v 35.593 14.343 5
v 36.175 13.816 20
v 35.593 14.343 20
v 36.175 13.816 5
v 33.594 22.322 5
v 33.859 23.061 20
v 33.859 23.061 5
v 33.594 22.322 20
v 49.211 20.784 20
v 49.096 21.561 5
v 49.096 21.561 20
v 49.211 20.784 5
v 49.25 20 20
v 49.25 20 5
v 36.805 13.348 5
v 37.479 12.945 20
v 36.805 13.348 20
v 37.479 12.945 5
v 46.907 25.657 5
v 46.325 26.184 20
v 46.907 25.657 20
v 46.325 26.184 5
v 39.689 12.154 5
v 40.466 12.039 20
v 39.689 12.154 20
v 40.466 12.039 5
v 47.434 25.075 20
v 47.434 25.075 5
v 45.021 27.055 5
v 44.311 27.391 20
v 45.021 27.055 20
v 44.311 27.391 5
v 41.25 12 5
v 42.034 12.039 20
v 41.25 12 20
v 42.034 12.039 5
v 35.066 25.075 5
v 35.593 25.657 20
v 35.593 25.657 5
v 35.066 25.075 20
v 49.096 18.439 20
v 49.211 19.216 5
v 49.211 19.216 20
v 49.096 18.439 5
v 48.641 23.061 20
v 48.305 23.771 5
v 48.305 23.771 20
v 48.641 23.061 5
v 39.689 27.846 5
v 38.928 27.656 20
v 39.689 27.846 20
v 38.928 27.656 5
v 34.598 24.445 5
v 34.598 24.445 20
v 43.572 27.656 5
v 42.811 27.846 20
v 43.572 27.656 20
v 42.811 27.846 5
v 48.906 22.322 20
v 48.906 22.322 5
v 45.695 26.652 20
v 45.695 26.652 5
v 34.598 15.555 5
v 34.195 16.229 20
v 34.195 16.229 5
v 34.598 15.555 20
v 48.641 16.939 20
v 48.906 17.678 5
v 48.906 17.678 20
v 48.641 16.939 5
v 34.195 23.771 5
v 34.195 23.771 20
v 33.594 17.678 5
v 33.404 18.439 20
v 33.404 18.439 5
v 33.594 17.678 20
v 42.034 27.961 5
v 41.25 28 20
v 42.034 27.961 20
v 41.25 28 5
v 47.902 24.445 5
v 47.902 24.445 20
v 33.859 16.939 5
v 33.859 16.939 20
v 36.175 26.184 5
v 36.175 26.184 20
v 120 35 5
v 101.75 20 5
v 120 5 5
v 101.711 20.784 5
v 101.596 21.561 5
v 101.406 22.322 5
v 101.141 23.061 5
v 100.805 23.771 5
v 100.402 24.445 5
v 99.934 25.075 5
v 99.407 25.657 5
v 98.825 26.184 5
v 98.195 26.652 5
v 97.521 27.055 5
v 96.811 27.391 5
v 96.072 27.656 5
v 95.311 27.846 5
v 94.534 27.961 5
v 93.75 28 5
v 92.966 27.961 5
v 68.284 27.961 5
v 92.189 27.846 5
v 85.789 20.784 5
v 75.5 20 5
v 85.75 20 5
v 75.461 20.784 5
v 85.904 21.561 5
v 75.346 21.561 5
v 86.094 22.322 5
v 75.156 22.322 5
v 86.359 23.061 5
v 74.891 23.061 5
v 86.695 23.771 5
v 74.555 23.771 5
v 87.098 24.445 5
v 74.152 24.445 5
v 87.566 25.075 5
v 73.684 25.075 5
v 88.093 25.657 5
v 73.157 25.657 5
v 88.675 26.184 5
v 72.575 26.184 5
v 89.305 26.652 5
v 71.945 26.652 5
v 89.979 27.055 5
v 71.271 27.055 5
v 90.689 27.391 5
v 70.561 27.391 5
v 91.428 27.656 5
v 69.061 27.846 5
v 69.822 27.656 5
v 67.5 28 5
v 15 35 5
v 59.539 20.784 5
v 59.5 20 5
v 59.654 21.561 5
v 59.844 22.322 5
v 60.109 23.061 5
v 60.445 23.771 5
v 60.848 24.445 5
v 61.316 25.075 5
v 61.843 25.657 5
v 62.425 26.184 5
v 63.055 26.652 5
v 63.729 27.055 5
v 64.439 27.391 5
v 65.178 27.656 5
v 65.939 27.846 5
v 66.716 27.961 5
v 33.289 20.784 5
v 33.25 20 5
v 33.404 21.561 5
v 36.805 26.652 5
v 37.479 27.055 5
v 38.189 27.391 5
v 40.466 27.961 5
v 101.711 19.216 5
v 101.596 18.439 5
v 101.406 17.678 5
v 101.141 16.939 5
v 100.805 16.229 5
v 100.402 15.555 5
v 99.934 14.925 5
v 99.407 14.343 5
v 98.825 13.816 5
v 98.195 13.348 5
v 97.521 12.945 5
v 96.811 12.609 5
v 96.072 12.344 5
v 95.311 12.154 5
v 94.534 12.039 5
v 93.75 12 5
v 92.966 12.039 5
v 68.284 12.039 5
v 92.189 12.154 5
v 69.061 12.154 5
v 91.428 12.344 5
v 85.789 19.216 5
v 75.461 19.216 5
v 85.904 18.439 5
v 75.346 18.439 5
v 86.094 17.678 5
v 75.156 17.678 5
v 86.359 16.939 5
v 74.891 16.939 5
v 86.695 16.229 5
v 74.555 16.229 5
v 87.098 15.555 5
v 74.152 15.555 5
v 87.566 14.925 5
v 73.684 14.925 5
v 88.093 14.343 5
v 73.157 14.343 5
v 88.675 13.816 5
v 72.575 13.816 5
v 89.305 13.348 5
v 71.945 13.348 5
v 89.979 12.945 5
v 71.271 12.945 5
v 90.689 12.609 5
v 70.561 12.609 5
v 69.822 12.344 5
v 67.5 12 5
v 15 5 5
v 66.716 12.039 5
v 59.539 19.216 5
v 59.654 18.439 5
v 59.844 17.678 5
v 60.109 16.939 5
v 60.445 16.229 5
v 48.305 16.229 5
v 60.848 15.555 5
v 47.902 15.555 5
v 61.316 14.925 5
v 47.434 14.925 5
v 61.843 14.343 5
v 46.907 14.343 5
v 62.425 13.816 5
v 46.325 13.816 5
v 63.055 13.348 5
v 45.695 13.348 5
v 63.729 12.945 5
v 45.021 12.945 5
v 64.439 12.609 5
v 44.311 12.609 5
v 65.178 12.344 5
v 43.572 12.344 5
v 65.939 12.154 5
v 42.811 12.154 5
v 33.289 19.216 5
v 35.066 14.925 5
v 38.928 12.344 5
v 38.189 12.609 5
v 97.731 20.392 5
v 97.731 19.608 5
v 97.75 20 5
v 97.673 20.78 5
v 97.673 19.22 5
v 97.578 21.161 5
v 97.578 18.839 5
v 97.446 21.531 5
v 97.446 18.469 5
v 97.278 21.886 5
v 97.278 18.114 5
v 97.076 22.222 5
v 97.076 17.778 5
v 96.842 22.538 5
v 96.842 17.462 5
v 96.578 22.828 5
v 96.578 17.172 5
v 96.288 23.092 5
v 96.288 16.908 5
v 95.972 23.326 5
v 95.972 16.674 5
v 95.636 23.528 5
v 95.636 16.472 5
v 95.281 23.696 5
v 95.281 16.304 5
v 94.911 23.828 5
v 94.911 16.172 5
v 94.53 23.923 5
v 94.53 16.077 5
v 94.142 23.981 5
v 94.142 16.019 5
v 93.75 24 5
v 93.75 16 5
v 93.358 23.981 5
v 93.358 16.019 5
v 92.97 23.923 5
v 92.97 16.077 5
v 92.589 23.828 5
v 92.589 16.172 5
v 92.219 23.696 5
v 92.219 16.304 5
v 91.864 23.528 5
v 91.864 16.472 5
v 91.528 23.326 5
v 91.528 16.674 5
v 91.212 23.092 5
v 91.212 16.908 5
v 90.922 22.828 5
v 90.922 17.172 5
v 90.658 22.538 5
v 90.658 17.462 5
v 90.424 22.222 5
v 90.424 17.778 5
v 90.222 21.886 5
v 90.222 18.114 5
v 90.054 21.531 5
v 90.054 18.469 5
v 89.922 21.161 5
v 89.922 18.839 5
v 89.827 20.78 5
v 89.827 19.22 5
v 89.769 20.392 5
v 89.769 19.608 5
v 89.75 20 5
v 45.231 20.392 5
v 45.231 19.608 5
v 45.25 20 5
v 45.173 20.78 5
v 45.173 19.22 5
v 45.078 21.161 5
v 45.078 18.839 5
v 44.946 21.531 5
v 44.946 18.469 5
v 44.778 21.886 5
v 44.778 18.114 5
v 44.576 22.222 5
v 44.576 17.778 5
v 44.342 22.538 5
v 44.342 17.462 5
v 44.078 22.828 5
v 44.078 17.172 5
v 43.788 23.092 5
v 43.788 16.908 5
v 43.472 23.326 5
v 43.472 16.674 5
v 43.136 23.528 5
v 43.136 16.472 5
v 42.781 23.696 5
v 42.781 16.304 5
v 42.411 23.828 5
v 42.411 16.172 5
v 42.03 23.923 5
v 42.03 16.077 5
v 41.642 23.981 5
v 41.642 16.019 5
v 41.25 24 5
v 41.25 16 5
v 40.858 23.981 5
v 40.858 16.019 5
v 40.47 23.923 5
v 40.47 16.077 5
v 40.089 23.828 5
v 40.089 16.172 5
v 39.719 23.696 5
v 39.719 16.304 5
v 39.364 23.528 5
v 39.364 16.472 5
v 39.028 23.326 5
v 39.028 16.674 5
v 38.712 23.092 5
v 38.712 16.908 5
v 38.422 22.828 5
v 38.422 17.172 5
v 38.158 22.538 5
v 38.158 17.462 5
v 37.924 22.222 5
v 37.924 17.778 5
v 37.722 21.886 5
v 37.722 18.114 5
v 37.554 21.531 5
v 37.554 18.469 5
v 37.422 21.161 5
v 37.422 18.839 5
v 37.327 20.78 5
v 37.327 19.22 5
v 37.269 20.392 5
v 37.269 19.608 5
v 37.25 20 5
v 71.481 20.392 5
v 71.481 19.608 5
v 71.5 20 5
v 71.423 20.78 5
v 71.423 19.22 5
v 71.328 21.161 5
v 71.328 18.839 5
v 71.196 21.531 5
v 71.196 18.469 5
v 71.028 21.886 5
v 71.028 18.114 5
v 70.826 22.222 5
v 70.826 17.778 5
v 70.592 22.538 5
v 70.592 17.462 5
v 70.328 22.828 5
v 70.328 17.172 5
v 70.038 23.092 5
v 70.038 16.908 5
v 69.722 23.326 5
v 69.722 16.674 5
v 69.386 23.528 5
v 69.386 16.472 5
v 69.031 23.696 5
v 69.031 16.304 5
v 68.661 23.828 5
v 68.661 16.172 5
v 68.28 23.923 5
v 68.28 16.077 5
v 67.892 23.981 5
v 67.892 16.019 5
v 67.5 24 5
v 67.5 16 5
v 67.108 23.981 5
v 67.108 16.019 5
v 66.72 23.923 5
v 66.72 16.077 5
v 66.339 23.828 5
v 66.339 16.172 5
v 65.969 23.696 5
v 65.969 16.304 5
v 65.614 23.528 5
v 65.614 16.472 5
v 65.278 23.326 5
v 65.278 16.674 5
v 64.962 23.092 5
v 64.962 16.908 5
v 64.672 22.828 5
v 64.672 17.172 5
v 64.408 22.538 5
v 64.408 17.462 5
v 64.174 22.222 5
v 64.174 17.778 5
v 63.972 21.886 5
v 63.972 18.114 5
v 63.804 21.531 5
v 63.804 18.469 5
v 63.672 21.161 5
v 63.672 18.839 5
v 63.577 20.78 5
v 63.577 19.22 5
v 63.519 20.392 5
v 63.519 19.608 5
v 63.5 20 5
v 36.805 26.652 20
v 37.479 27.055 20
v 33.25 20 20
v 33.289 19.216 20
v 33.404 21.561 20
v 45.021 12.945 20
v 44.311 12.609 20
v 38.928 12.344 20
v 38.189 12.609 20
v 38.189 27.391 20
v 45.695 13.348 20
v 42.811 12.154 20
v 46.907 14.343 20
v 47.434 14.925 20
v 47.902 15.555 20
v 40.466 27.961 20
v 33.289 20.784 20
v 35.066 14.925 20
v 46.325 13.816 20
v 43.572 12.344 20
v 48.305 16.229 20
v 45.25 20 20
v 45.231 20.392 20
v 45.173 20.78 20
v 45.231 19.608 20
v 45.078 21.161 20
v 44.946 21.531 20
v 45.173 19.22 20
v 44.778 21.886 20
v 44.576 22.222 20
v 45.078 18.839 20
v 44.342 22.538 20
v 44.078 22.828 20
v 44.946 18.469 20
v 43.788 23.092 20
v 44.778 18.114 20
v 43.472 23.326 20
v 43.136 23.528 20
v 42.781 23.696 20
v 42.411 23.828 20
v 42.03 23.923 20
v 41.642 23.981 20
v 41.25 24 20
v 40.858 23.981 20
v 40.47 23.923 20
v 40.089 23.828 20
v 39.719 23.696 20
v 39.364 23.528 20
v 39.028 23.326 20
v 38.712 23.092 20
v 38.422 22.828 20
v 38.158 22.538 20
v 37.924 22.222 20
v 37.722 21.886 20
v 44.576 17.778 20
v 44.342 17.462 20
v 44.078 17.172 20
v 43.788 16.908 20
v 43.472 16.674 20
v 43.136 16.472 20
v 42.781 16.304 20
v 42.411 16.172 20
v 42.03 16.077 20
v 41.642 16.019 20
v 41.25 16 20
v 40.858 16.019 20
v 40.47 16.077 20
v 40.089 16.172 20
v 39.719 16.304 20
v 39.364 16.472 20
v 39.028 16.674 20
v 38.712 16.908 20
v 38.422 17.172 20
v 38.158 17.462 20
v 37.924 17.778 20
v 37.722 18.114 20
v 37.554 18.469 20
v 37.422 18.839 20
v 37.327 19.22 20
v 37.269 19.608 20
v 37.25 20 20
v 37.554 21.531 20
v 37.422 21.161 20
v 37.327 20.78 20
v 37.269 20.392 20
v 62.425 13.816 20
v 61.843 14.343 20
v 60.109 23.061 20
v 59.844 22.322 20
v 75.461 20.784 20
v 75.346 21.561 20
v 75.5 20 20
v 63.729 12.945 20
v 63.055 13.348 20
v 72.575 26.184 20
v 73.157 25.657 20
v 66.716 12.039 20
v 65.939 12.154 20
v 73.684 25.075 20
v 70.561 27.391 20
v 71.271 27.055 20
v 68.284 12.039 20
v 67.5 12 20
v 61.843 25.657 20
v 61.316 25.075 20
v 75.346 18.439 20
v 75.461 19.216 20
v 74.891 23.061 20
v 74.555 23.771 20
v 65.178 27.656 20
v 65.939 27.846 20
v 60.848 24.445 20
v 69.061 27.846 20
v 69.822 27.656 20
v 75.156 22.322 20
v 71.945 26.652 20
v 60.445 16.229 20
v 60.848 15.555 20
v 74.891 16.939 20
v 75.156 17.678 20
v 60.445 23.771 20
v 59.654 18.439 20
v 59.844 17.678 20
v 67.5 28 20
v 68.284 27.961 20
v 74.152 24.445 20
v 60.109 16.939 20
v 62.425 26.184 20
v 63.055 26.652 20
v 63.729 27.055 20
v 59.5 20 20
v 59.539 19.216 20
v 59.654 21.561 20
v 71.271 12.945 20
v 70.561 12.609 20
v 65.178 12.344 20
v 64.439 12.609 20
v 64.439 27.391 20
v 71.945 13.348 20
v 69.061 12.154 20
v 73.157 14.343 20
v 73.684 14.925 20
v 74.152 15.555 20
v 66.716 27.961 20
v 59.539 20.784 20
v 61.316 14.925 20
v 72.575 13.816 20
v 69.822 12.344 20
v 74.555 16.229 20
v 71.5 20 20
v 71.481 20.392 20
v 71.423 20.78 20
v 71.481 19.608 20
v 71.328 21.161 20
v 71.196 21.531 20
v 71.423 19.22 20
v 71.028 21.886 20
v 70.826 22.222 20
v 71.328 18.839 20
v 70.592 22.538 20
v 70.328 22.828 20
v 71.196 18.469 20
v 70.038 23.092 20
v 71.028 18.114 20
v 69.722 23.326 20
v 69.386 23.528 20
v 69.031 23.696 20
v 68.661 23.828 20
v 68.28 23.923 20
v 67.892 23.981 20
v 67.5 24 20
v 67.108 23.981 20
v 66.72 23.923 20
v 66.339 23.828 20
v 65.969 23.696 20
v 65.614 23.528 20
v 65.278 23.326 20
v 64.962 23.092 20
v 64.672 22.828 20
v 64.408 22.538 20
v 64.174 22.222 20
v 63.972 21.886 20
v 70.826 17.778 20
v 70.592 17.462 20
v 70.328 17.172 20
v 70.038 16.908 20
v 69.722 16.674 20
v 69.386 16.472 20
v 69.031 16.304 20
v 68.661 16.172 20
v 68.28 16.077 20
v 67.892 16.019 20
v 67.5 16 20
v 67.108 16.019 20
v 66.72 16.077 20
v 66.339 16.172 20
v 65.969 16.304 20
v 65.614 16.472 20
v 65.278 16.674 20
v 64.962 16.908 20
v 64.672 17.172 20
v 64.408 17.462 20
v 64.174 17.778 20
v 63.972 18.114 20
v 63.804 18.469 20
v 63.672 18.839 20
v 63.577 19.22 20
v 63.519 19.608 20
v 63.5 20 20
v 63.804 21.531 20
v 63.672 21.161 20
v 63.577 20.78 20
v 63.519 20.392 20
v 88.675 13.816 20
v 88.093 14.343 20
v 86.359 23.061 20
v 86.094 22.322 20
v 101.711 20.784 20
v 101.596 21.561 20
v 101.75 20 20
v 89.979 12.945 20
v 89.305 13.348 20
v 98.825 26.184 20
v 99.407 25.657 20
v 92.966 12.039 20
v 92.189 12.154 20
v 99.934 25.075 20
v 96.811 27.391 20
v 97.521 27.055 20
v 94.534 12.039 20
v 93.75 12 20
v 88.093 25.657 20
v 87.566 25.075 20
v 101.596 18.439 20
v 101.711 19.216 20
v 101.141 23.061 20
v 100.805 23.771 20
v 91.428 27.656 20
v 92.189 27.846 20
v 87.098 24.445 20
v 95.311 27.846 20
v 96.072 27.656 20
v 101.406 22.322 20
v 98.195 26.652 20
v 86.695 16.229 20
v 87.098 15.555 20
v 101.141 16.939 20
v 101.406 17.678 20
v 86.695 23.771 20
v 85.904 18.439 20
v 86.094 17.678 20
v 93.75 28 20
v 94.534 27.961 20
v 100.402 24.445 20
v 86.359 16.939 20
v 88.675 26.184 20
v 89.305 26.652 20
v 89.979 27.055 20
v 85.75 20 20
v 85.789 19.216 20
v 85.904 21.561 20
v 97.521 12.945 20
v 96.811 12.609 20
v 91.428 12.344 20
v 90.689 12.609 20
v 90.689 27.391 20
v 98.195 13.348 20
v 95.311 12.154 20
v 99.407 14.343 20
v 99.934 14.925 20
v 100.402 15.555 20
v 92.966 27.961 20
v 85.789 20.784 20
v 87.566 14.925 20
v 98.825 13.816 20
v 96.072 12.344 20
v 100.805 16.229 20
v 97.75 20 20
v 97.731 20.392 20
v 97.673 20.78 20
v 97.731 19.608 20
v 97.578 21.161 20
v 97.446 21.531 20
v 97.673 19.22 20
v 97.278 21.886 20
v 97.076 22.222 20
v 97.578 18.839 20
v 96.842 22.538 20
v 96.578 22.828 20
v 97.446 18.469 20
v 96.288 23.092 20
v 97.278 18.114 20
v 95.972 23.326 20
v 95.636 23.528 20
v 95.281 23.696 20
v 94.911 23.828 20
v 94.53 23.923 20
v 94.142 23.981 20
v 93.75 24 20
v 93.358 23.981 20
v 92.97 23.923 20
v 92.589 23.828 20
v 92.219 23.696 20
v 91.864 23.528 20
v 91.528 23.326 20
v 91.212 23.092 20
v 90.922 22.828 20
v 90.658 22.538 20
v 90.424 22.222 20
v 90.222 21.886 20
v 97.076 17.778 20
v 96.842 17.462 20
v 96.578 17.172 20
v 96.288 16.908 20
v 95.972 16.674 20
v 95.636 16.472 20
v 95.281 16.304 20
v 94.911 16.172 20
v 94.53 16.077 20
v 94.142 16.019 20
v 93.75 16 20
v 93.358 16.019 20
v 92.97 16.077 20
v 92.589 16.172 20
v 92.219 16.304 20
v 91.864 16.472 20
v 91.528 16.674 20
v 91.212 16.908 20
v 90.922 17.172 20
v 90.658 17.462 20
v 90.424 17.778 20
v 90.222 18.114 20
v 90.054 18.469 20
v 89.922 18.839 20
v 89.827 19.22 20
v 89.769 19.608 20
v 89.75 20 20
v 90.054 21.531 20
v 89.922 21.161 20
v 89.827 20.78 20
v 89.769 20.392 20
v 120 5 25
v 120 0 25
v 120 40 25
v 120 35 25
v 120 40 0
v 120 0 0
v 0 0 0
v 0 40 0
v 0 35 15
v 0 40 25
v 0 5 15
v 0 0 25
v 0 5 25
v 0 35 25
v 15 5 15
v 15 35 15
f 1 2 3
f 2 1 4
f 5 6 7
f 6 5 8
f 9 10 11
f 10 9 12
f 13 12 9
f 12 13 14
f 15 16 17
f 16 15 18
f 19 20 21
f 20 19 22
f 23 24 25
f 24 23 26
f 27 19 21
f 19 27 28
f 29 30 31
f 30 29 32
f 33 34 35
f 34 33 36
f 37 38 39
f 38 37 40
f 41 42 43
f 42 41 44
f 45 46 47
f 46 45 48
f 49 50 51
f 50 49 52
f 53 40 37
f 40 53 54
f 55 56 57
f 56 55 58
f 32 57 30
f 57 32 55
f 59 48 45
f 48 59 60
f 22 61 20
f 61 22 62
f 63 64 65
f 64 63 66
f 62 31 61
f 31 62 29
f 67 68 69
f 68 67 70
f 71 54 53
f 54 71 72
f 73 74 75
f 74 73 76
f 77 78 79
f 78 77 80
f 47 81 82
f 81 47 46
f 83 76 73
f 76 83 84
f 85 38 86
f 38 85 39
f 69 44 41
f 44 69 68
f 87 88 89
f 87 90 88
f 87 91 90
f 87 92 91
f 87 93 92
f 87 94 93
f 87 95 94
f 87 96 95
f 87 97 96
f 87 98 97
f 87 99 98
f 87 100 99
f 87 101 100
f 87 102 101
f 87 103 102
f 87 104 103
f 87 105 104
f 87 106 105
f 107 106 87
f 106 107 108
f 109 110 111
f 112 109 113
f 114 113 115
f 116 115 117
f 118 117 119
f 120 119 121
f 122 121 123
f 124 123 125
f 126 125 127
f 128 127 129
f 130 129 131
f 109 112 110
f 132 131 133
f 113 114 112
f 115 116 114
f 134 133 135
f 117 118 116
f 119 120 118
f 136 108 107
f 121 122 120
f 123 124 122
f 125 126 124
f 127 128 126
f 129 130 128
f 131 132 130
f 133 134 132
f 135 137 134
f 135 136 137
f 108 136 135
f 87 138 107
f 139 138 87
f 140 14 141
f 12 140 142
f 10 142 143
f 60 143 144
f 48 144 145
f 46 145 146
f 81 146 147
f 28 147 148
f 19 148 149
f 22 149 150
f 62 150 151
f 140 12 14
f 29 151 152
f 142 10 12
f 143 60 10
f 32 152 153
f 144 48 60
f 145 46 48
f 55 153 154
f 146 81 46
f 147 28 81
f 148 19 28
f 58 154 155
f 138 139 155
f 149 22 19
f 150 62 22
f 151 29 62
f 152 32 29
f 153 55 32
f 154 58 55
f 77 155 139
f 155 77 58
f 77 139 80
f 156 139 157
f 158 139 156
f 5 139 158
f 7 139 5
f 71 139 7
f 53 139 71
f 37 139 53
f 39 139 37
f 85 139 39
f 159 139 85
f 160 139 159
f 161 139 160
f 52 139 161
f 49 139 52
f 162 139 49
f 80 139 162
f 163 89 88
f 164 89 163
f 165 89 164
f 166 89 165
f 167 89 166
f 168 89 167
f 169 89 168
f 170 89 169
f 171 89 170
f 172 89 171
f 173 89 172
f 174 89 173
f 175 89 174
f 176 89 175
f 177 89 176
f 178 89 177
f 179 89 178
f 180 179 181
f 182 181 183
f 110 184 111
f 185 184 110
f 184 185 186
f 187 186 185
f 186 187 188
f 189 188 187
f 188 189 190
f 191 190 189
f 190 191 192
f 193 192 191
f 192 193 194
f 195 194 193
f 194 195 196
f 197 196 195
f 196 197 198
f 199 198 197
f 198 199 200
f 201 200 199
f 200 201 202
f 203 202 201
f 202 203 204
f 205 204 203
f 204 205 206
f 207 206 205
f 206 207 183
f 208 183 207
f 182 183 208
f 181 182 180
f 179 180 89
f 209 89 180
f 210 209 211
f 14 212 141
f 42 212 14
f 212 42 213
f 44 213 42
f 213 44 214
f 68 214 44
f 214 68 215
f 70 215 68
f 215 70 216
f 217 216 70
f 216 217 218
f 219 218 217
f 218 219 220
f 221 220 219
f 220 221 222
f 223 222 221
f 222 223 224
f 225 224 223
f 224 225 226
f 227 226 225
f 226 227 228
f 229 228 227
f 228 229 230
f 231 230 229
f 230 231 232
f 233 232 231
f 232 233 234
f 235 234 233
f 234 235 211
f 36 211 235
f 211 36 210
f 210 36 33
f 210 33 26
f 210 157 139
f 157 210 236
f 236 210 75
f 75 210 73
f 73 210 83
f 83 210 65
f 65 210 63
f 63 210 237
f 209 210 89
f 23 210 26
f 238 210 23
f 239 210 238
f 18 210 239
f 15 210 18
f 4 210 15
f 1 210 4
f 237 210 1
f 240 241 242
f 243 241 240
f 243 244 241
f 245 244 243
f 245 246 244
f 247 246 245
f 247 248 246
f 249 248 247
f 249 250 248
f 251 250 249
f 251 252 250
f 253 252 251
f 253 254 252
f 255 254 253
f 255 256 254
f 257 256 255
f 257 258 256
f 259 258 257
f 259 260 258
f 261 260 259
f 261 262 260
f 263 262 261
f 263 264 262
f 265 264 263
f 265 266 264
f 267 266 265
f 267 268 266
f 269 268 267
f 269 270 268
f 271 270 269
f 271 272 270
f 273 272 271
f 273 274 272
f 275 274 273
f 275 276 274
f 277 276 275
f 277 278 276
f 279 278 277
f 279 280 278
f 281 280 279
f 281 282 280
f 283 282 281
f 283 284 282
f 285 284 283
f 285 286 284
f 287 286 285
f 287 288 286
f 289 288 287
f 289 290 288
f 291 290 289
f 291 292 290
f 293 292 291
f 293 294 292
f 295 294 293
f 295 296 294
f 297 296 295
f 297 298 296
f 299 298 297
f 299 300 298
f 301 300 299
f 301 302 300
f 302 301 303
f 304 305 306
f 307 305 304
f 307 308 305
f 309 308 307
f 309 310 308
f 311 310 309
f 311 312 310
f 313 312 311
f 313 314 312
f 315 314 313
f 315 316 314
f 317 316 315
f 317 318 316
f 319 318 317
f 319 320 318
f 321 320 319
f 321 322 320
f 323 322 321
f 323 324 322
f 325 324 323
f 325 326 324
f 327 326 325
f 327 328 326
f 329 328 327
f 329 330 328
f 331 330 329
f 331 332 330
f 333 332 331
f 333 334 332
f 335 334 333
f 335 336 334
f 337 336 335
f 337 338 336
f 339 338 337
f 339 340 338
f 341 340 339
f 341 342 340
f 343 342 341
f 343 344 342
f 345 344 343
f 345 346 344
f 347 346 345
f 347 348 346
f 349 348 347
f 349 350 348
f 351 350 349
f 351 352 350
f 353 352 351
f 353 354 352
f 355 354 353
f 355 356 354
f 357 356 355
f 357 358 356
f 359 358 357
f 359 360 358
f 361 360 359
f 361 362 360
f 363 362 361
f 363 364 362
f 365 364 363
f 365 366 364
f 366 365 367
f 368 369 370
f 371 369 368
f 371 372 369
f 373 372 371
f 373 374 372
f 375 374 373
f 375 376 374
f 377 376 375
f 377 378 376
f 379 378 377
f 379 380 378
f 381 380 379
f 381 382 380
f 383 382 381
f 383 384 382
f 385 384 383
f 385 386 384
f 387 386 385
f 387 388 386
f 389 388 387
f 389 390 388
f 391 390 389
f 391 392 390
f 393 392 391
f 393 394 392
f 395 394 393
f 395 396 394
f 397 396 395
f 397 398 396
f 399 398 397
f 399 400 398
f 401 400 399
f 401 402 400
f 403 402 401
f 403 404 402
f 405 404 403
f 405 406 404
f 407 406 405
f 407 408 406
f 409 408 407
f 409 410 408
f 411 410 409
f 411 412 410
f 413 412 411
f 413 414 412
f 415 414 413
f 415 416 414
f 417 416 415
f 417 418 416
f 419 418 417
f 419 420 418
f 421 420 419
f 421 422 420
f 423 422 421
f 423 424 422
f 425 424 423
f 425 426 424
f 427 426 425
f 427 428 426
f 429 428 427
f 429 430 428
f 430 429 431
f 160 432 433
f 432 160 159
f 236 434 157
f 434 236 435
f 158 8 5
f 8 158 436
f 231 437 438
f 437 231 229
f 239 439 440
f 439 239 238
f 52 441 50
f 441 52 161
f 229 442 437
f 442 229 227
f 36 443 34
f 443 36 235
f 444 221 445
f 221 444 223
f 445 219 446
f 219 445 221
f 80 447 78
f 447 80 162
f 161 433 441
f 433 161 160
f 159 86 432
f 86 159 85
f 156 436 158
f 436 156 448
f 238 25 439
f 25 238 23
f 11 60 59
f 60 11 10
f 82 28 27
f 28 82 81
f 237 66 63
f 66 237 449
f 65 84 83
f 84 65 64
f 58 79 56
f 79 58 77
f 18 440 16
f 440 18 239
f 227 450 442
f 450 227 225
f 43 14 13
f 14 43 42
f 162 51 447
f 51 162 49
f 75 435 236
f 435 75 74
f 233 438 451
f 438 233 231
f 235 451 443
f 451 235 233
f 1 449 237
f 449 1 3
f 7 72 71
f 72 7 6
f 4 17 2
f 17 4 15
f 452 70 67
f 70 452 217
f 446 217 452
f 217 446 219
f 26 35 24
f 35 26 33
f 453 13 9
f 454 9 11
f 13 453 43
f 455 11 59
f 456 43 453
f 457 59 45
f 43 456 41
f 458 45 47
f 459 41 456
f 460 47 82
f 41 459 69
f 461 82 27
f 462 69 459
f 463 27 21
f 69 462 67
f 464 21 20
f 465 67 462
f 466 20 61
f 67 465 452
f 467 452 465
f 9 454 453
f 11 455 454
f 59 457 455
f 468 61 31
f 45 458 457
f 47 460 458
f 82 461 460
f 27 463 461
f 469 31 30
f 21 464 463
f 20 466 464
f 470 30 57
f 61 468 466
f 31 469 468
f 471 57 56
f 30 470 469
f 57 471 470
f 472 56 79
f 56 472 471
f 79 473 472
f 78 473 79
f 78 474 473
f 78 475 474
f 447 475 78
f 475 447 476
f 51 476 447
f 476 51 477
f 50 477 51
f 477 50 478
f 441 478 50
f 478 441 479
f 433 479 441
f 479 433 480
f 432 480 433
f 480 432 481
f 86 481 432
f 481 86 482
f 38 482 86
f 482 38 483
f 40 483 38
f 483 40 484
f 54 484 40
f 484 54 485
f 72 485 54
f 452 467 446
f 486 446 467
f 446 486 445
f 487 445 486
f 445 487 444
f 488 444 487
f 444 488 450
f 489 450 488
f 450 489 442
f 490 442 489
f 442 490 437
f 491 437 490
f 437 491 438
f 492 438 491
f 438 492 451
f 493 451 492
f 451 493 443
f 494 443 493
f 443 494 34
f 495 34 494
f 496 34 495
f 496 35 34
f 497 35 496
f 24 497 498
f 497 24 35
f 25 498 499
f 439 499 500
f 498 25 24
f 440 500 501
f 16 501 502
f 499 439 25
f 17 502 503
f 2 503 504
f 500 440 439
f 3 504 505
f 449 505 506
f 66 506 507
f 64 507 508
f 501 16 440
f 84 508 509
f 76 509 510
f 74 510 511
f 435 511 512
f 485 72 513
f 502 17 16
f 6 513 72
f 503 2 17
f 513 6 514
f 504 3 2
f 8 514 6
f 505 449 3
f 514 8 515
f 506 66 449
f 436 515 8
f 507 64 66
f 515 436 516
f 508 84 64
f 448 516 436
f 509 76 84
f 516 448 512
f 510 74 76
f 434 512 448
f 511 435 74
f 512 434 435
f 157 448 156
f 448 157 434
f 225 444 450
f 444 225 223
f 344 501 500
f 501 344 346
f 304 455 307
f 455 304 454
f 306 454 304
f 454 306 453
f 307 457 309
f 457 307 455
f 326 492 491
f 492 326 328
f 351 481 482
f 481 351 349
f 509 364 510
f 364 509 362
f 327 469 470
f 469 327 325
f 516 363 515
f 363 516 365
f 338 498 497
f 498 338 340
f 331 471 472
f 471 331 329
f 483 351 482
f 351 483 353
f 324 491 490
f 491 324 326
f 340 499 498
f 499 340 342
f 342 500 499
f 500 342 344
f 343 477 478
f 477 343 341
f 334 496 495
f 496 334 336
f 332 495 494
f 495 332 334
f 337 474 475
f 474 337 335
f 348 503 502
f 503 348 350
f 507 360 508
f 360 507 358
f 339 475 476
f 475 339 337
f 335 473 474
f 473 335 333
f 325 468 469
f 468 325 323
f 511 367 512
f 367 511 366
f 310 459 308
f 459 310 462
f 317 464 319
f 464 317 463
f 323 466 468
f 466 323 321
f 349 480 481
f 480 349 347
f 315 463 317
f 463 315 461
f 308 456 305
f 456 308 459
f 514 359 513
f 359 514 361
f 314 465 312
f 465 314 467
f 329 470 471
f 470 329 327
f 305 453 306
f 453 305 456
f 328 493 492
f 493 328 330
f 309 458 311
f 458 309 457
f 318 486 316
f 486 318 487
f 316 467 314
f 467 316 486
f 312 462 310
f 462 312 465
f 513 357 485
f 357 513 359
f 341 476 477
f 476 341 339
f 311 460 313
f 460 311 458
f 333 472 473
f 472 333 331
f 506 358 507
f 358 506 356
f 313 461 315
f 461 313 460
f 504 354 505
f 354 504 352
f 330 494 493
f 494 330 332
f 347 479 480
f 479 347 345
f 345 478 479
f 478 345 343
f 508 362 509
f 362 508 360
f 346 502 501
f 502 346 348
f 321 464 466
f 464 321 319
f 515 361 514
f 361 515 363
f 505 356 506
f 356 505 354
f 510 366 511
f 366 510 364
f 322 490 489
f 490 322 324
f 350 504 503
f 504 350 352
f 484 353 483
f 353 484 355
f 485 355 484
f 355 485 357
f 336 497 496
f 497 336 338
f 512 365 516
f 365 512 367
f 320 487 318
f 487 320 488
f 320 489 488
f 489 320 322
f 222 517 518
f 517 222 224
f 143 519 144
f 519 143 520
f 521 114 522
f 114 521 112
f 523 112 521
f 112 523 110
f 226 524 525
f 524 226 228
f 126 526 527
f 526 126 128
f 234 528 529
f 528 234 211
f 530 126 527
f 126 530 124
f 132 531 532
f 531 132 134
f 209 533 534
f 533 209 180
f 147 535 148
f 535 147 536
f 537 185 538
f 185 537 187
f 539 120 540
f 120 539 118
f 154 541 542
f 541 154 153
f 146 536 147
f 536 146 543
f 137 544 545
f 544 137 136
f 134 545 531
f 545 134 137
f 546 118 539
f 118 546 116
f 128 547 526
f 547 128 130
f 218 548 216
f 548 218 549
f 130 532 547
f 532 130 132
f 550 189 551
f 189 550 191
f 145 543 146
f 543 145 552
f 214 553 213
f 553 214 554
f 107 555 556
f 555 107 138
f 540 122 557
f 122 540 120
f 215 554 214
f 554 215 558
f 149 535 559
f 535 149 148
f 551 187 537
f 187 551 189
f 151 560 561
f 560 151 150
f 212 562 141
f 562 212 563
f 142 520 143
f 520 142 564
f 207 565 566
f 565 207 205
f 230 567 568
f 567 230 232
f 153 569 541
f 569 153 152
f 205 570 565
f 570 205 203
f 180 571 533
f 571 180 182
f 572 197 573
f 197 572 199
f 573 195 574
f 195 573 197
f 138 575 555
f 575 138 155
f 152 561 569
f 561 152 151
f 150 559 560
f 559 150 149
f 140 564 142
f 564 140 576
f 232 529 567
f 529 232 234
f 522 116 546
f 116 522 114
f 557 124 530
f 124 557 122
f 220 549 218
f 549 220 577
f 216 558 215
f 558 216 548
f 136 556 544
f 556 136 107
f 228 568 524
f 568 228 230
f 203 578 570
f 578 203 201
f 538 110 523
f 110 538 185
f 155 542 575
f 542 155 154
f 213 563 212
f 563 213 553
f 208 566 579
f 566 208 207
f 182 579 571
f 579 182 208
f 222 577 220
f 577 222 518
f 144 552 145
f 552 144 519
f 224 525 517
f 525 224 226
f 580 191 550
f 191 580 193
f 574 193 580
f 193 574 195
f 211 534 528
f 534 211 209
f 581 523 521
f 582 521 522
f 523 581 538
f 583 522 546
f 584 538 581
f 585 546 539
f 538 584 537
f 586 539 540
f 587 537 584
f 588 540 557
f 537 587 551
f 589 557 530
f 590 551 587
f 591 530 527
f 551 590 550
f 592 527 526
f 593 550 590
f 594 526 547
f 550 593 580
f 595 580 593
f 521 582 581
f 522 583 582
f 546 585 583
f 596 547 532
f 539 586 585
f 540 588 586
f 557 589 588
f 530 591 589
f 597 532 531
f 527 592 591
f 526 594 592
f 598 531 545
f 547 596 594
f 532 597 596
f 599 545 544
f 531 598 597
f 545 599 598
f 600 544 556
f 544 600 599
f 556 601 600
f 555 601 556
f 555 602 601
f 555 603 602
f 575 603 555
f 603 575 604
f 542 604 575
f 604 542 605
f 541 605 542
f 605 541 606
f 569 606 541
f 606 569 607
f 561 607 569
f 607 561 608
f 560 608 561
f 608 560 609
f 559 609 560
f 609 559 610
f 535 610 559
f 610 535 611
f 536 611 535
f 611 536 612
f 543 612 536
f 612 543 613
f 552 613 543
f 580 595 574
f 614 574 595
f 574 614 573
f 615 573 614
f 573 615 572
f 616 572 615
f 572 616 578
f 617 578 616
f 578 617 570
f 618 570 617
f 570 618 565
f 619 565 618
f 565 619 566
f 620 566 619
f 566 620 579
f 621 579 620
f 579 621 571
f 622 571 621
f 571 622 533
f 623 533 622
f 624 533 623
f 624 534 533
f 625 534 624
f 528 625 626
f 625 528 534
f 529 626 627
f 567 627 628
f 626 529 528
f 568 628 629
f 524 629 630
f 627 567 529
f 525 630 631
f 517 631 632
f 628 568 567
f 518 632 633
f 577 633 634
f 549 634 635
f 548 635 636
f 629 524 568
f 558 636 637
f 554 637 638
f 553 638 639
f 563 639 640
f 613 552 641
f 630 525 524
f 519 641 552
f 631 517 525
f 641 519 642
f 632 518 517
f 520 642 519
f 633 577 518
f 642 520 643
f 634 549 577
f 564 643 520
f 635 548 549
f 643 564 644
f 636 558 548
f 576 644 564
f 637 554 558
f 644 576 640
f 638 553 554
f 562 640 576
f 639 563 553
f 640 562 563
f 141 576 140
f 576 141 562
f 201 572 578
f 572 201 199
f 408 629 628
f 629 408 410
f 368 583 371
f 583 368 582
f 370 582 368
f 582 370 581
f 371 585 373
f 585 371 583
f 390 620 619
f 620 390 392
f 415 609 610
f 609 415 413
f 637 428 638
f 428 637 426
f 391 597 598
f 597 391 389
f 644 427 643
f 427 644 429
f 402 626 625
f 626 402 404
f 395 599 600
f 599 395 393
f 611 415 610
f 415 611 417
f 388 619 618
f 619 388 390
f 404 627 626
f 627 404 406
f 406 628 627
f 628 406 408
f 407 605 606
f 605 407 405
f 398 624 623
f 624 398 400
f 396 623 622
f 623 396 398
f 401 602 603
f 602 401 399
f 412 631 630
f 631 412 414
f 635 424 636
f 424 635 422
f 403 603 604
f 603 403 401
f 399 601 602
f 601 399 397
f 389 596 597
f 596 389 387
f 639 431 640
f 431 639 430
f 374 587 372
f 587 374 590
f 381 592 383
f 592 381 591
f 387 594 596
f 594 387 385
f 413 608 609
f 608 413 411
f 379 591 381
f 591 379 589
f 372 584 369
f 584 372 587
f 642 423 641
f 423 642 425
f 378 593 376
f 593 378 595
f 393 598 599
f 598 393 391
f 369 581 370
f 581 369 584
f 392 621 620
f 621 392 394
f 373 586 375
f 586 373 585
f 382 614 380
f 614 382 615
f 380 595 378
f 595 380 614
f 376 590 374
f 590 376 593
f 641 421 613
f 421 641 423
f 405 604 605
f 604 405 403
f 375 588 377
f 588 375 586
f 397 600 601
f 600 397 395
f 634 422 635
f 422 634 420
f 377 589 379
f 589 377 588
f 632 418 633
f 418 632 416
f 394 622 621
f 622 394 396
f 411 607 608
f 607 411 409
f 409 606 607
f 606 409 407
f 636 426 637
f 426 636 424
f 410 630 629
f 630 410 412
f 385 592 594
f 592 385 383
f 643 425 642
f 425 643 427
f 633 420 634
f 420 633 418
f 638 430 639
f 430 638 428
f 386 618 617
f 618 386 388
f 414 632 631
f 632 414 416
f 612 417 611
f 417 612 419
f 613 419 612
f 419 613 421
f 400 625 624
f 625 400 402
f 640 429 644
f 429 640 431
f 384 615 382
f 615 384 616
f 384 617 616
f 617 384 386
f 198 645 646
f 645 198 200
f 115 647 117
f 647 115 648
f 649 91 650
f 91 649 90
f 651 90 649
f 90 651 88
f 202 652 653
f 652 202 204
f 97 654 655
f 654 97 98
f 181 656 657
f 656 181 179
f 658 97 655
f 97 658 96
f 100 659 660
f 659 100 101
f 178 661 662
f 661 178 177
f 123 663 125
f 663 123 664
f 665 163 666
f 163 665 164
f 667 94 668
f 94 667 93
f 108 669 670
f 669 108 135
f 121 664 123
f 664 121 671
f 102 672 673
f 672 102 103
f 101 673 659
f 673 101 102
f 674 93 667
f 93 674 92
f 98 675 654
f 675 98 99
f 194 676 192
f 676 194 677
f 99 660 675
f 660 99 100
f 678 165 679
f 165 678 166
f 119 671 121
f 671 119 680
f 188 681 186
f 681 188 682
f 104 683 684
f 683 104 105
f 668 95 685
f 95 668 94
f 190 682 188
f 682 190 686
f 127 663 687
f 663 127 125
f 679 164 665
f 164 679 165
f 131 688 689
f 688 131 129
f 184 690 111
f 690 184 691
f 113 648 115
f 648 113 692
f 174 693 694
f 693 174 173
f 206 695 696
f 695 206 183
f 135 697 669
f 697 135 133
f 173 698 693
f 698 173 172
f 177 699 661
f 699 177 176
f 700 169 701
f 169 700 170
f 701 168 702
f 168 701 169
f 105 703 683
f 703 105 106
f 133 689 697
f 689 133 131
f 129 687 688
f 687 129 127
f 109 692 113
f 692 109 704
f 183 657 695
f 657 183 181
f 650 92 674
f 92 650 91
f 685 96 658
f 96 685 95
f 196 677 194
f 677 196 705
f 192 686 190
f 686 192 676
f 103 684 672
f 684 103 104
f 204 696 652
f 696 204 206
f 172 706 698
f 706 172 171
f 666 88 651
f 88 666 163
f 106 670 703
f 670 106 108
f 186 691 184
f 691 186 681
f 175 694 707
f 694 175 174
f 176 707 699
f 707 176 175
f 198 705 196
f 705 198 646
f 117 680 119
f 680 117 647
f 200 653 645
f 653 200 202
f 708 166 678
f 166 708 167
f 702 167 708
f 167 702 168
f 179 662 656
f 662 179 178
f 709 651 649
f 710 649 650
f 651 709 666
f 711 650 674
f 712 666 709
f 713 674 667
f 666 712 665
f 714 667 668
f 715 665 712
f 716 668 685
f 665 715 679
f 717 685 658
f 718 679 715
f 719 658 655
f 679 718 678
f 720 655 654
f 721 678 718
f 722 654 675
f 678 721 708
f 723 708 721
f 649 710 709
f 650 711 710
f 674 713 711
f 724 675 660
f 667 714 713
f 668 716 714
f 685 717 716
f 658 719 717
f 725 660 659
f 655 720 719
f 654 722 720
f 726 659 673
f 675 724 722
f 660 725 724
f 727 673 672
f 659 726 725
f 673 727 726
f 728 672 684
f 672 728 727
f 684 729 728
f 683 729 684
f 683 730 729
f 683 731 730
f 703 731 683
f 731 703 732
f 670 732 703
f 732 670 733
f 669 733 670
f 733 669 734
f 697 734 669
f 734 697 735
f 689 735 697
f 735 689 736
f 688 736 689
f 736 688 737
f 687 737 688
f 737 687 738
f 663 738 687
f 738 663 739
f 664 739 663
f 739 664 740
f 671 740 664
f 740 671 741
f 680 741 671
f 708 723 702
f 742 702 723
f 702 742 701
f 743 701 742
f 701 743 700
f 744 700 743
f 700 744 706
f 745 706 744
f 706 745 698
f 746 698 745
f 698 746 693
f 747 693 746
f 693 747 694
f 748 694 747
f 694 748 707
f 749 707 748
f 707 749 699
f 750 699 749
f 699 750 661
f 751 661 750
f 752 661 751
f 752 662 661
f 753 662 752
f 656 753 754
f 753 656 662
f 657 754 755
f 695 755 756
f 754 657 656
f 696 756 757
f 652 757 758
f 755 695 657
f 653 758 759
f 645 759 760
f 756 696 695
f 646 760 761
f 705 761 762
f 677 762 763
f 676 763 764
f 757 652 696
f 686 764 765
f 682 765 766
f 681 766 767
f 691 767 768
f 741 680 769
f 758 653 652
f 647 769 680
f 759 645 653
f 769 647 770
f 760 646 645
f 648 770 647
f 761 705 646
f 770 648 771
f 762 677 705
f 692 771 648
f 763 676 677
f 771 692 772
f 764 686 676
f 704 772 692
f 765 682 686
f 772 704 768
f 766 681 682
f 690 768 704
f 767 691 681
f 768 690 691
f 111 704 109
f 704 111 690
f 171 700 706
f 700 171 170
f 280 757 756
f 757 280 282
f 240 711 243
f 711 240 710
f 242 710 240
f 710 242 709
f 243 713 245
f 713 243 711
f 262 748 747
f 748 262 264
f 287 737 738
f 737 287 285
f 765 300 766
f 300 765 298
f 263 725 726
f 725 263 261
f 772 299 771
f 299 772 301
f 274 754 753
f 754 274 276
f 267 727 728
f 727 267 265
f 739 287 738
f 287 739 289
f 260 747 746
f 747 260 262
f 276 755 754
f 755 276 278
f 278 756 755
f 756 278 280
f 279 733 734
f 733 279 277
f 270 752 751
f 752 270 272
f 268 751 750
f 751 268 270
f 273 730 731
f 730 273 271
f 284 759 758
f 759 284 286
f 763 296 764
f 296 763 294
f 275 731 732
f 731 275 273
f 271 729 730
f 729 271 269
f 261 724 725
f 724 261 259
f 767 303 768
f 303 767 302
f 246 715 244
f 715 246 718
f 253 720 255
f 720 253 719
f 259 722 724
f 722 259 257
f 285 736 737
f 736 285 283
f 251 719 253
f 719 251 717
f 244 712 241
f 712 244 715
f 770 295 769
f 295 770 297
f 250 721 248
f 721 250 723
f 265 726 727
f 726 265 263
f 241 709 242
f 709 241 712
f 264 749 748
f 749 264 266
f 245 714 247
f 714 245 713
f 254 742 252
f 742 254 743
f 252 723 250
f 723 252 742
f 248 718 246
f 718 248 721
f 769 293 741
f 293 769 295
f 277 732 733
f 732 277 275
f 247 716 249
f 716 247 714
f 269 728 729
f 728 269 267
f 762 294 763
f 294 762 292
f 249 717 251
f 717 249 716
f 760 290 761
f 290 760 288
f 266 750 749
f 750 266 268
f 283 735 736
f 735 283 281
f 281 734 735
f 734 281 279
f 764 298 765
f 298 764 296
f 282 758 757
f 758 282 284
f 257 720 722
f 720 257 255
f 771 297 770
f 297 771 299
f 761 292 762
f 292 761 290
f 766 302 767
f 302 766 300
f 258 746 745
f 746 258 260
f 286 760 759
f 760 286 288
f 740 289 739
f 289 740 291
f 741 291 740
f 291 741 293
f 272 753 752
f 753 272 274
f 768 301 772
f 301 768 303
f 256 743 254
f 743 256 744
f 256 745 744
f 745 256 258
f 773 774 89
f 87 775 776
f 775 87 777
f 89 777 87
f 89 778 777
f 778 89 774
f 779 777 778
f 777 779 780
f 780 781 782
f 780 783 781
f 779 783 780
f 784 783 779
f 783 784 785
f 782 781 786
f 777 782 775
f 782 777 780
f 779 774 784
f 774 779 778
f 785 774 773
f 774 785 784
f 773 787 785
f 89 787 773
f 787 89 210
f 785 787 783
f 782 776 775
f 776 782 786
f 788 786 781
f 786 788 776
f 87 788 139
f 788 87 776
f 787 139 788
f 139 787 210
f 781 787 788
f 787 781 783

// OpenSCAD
// Parameters
$fn = 64;

base_length = 120;
base_width = 40;
base_thickness = 5;

wall_thickness = 5;
wall_height = 20;

tab_length = 15;
tab_height = 10;

post_od = 16;
post_id = 8;
post_height = 15;
post_count = 3;

// Channel width between side walls
channel_width = base_width - 2 * wall_thickness;

// Annular post module
module annular_post(h, od, id) {
    difference() {
        cylinder(h = h, d = od);
        translate([0, 0, -0.1])
            cylinder(h = h + 0.2, d = id);
    }
}

// Main assembly
union() {
    // Flat rectangular base
    cube([base_length, base_width, base_thickness]);

    // Raised long side walls
    translate([0, 0, base_thickness])
        cube([base_length, wall_thickness, wall_height]);

    translate([0, base_width - wall_thickness, base_thickness])
        cube([base_length, wall_thickness, wall_height]);

    // Short rectangular end tab
    translate([0, wall_thickness, base_thickness])
        cube([tab_length, channel_width, tab_height]);

    // Centered row of annular cylindrical posts
    available_length = base_length - tab_length;
    post_spacing = available_length / (post_count + 1);

    for (i = [1 : post_count]) {
        translate([tab_length + i * post_spacing, base_width / 2, base_thickness])
            annular_post(post_height, post_od, post_id);
    }
}
